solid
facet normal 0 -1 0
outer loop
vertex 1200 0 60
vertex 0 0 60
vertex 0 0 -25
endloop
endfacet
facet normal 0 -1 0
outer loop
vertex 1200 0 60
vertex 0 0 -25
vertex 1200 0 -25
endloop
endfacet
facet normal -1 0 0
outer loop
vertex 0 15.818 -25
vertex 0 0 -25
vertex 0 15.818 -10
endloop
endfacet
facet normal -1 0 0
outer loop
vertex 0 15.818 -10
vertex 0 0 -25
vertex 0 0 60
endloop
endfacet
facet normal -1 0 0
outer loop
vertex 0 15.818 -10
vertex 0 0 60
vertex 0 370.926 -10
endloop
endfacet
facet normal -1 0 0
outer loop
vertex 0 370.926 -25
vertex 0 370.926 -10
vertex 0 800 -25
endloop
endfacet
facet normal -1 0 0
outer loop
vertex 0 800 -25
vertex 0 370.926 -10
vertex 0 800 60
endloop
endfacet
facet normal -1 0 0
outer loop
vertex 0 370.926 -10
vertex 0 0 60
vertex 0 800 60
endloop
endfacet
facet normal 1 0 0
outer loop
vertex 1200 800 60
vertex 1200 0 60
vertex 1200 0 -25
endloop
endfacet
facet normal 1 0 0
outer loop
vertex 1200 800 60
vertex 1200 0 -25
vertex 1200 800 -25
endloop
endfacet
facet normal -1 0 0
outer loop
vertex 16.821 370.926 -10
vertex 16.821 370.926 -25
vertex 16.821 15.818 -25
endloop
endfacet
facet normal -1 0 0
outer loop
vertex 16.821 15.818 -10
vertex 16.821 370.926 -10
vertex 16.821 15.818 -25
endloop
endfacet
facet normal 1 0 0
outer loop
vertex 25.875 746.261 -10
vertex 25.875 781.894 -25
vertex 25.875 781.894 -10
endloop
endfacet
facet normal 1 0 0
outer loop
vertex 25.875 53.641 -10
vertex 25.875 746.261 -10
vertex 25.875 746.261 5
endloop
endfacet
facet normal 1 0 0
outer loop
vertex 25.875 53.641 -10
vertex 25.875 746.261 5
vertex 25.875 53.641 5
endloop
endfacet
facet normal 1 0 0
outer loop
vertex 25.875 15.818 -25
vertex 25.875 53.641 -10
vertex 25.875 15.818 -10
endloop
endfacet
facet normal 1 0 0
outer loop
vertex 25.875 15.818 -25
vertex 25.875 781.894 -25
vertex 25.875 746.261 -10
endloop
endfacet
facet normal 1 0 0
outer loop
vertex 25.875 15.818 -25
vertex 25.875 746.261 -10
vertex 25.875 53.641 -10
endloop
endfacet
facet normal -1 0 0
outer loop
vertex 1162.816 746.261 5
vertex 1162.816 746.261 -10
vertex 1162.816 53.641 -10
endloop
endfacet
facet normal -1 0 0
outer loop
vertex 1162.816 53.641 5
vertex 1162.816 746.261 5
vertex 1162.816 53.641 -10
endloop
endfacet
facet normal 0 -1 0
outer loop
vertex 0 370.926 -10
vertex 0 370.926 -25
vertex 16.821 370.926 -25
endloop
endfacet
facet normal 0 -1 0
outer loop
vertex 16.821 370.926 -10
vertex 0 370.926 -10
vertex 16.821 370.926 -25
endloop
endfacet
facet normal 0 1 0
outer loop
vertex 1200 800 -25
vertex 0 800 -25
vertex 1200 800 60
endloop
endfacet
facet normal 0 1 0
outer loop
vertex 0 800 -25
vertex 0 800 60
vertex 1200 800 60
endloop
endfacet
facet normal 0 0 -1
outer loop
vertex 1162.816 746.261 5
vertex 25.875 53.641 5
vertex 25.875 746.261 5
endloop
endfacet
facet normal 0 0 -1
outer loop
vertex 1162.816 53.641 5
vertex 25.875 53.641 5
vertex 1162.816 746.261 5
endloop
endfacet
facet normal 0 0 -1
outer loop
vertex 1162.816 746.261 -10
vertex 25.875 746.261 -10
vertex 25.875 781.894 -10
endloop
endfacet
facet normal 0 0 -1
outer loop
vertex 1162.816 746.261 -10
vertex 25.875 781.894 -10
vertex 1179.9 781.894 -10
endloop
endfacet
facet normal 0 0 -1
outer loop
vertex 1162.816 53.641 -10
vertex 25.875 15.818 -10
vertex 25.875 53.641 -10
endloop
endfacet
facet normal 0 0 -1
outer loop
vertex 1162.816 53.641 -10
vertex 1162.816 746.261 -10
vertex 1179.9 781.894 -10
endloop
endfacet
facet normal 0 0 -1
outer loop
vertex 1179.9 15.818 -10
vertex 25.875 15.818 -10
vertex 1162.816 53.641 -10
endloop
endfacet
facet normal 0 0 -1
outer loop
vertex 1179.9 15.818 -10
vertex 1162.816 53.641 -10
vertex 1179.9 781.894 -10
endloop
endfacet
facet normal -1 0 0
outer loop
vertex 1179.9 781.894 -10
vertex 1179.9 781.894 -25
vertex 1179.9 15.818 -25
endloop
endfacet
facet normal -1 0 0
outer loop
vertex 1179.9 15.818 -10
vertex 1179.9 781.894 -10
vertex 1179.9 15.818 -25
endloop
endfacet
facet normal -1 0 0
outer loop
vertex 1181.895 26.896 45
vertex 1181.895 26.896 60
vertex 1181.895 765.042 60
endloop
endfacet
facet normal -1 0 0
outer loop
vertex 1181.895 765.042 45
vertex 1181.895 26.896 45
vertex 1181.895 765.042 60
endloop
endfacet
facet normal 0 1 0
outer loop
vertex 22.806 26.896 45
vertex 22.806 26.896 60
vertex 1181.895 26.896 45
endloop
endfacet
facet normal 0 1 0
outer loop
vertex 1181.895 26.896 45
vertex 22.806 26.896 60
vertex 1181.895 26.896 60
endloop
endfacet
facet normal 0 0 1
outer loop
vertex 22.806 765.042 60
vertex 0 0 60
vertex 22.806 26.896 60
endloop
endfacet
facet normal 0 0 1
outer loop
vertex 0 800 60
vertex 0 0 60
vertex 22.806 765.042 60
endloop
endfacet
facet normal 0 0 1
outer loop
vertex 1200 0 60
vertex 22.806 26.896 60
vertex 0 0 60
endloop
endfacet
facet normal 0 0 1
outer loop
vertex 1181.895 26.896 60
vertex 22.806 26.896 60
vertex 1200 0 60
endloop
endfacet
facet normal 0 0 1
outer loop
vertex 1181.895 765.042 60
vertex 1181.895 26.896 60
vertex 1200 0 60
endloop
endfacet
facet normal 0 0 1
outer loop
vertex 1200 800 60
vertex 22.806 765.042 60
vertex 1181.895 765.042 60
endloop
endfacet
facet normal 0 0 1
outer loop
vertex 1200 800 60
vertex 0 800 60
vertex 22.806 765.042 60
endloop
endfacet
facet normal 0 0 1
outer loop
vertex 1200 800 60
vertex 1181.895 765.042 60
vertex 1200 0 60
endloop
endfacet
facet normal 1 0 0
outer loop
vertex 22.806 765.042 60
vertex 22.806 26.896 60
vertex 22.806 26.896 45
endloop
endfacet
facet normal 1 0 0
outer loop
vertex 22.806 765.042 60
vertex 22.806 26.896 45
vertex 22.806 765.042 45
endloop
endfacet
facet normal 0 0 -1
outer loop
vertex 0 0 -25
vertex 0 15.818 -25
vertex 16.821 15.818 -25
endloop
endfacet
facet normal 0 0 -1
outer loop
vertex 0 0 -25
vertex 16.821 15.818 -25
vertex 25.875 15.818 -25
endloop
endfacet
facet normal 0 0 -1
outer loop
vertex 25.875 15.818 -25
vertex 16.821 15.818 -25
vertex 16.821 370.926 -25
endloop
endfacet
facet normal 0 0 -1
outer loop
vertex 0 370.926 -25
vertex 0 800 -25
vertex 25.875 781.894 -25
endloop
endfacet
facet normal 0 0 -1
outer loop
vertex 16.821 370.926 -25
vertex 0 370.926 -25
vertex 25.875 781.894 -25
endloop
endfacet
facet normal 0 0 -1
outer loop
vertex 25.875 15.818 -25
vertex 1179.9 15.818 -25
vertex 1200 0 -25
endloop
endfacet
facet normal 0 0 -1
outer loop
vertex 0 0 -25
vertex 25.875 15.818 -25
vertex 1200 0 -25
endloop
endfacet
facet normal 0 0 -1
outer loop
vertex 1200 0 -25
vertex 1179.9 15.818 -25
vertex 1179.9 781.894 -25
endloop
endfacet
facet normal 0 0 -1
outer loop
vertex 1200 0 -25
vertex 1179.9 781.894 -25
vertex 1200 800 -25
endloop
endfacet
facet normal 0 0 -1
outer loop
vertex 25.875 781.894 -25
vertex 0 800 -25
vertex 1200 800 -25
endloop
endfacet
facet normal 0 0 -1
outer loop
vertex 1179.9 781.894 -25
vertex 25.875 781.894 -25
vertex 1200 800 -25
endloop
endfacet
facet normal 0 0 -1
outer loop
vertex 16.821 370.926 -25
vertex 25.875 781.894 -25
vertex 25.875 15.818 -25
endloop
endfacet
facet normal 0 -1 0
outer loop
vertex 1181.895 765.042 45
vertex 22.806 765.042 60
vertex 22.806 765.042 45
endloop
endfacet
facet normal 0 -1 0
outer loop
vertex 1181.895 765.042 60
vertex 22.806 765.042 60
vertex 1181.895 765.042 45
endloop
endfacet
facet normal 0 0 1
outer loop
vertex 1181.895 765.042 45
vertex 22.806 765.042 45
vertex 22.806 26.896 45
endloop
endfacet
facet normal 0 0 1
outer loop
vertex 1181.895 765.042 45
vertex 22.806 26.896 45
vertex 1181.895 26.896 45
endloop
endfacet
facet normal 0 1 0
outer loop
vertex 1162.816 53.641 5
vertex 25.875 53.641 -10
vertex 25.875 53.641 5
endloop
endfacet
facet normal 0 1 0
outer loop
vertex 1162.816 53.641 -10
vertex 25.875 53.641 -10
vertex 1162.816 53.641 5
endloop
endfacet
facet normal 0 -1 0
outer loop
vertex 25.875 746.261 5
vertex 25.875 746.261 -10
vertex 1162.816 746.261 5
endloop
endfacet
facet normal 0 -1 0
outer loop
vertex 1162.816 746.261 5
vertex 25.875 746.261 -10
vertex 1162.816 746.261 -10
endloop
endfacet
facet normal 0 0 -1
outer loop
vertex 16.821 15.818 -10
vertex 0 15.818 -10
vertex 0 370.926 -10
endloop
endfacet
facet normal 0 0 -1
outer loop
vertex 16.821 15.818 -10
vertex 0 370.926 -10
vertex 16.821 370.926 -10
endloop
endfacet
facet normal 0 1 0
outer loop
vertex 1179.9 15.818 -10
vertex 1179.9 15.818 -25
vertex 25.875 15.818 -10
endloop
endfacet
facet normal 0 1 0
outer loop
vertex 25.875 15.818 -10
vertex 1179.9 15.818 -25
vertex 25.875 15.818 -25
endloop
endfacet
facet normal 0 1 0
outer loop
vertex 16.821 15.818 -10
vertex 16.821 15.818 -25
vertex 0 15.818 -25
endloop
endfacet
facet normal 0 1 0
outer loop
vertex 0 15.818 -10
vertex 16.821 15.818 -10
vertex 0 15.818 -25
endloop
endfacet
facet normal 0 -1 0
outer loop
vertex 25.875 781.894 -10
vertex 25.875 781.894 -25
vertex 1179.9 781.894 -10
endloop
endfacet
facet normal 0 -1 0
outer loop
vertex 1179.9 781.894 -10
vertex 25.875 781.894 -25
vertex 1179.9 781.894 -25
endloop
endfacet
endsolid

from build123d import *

# Parameters (mm, degrees)
F0_W      = 1200
F0_H      = 800
F1_DEPTH  = 60
F4_DEPTH  = 25
F5_W      = 1136.9413696229
F5_H      = 692.619483918
F6_DEPTH  = 30
F7_W      = 1159.0888965875
F7_H      = 738.1461262703
F8_DEPTH  = 15
F9_W      = 180.6832998991
F9_H      = 355.1081307232
F9_W_2    = 16.8206766248
F9_W_3    = 982.4556671083
F9_H_2    = 21.863527596
F9_H_3    = 568.6533860862
F10_DEPTH = 15


# Not quite as in the source:
# - the program builds the solid bodies; features that only make, move or delete a surface that nothing else refers to are left out


with BuildPart() as f1:
    # F0 (on Top) → F1 (new body)
    with BuildSketch(Plane.XY):
        with Locations((600, 400)):
            Rectangle(F0_W, F0_H)
    extrude(amount=F1_DEPTH)

    # F4 (add): a face of the model
    f4_faces = [f1.faces().sort_by_distance(p)[0] for p in [
        (600, 400, 0),
    ]]
    extrude(f4_faces, amount=F4_DEPTH)

    # F5 (on face) → F6 (cut)
    with BuildSketch(Plane(origin=(0, 0, -25), x_dir=(1, 0, 0), z_dir=(0, 0, -1))):
        with Locations((594.3454820663, -399.9507818371)):
            Rectangle(F5_W, F5_H)
    extrude(amount=-F6_DEPTH, mode=Mode.SUBTRACT)

    # F7 (on face) → F8 (cut)
    with BuildSketch(Plane.XY.offset(60)):
        with Locations((602.350092493, 395.9690630436)):
            Rectangle(F7_W, F7_H)
    extrude(amount=-F8_DEPTH, mode=Mode.SUBTRACT)

    # F9 (on face) → F10 (cut)
    with BuildSketch(Plane(origin=(0, 0, -25), x_dir=(1, 0, 0), z_dir=(0, 0, -1))):
        with Locations((-90.3416499496, -193.3716591448)):
            Rectangle(F9_W, F9_H)
        with Locations((8.4103383124, -193.3716591448)):
            Rectangle(F9_W_2, F9_H)
        with Locations((517.1026308089, -42.7092760801)):
            Rectangle(F9_W_3, F9_H_2)
        Polygon((1162.8161668777, -53.6410398781), (1008.3304643631, -53.6410398781), (1008.3304643631, -622.2944259644), (25.8747972548, -622.2944259644), (25.8747972548, -746.2605237961), (1162.8161668777, -746.2605237961), align=None)
        with Locations((517.1026308089, -337.9677329212)):
            Rectangle(F9_W_3, F9_H_3)
        Polygon((25.8747972548, -15.8175937831), (25.8747972548, -31.7775122821), (1008.3304643631, -31.7775122821), (1008.3304643631, -53.6410398781), (1162.8161668777, -53.6410398781), (1162.8161668777, -746.2605237961), (25.8747972548, -746.2605237961), (25.8747972548, -781.8935513496), (1179.8995733261, -781.8935513496), (1179.8995733261, -15.8175937831), align=None)
    extrude(amount=-F10_DEPTH, mode=Mode.SUBTRACT)


solid = f1.part
